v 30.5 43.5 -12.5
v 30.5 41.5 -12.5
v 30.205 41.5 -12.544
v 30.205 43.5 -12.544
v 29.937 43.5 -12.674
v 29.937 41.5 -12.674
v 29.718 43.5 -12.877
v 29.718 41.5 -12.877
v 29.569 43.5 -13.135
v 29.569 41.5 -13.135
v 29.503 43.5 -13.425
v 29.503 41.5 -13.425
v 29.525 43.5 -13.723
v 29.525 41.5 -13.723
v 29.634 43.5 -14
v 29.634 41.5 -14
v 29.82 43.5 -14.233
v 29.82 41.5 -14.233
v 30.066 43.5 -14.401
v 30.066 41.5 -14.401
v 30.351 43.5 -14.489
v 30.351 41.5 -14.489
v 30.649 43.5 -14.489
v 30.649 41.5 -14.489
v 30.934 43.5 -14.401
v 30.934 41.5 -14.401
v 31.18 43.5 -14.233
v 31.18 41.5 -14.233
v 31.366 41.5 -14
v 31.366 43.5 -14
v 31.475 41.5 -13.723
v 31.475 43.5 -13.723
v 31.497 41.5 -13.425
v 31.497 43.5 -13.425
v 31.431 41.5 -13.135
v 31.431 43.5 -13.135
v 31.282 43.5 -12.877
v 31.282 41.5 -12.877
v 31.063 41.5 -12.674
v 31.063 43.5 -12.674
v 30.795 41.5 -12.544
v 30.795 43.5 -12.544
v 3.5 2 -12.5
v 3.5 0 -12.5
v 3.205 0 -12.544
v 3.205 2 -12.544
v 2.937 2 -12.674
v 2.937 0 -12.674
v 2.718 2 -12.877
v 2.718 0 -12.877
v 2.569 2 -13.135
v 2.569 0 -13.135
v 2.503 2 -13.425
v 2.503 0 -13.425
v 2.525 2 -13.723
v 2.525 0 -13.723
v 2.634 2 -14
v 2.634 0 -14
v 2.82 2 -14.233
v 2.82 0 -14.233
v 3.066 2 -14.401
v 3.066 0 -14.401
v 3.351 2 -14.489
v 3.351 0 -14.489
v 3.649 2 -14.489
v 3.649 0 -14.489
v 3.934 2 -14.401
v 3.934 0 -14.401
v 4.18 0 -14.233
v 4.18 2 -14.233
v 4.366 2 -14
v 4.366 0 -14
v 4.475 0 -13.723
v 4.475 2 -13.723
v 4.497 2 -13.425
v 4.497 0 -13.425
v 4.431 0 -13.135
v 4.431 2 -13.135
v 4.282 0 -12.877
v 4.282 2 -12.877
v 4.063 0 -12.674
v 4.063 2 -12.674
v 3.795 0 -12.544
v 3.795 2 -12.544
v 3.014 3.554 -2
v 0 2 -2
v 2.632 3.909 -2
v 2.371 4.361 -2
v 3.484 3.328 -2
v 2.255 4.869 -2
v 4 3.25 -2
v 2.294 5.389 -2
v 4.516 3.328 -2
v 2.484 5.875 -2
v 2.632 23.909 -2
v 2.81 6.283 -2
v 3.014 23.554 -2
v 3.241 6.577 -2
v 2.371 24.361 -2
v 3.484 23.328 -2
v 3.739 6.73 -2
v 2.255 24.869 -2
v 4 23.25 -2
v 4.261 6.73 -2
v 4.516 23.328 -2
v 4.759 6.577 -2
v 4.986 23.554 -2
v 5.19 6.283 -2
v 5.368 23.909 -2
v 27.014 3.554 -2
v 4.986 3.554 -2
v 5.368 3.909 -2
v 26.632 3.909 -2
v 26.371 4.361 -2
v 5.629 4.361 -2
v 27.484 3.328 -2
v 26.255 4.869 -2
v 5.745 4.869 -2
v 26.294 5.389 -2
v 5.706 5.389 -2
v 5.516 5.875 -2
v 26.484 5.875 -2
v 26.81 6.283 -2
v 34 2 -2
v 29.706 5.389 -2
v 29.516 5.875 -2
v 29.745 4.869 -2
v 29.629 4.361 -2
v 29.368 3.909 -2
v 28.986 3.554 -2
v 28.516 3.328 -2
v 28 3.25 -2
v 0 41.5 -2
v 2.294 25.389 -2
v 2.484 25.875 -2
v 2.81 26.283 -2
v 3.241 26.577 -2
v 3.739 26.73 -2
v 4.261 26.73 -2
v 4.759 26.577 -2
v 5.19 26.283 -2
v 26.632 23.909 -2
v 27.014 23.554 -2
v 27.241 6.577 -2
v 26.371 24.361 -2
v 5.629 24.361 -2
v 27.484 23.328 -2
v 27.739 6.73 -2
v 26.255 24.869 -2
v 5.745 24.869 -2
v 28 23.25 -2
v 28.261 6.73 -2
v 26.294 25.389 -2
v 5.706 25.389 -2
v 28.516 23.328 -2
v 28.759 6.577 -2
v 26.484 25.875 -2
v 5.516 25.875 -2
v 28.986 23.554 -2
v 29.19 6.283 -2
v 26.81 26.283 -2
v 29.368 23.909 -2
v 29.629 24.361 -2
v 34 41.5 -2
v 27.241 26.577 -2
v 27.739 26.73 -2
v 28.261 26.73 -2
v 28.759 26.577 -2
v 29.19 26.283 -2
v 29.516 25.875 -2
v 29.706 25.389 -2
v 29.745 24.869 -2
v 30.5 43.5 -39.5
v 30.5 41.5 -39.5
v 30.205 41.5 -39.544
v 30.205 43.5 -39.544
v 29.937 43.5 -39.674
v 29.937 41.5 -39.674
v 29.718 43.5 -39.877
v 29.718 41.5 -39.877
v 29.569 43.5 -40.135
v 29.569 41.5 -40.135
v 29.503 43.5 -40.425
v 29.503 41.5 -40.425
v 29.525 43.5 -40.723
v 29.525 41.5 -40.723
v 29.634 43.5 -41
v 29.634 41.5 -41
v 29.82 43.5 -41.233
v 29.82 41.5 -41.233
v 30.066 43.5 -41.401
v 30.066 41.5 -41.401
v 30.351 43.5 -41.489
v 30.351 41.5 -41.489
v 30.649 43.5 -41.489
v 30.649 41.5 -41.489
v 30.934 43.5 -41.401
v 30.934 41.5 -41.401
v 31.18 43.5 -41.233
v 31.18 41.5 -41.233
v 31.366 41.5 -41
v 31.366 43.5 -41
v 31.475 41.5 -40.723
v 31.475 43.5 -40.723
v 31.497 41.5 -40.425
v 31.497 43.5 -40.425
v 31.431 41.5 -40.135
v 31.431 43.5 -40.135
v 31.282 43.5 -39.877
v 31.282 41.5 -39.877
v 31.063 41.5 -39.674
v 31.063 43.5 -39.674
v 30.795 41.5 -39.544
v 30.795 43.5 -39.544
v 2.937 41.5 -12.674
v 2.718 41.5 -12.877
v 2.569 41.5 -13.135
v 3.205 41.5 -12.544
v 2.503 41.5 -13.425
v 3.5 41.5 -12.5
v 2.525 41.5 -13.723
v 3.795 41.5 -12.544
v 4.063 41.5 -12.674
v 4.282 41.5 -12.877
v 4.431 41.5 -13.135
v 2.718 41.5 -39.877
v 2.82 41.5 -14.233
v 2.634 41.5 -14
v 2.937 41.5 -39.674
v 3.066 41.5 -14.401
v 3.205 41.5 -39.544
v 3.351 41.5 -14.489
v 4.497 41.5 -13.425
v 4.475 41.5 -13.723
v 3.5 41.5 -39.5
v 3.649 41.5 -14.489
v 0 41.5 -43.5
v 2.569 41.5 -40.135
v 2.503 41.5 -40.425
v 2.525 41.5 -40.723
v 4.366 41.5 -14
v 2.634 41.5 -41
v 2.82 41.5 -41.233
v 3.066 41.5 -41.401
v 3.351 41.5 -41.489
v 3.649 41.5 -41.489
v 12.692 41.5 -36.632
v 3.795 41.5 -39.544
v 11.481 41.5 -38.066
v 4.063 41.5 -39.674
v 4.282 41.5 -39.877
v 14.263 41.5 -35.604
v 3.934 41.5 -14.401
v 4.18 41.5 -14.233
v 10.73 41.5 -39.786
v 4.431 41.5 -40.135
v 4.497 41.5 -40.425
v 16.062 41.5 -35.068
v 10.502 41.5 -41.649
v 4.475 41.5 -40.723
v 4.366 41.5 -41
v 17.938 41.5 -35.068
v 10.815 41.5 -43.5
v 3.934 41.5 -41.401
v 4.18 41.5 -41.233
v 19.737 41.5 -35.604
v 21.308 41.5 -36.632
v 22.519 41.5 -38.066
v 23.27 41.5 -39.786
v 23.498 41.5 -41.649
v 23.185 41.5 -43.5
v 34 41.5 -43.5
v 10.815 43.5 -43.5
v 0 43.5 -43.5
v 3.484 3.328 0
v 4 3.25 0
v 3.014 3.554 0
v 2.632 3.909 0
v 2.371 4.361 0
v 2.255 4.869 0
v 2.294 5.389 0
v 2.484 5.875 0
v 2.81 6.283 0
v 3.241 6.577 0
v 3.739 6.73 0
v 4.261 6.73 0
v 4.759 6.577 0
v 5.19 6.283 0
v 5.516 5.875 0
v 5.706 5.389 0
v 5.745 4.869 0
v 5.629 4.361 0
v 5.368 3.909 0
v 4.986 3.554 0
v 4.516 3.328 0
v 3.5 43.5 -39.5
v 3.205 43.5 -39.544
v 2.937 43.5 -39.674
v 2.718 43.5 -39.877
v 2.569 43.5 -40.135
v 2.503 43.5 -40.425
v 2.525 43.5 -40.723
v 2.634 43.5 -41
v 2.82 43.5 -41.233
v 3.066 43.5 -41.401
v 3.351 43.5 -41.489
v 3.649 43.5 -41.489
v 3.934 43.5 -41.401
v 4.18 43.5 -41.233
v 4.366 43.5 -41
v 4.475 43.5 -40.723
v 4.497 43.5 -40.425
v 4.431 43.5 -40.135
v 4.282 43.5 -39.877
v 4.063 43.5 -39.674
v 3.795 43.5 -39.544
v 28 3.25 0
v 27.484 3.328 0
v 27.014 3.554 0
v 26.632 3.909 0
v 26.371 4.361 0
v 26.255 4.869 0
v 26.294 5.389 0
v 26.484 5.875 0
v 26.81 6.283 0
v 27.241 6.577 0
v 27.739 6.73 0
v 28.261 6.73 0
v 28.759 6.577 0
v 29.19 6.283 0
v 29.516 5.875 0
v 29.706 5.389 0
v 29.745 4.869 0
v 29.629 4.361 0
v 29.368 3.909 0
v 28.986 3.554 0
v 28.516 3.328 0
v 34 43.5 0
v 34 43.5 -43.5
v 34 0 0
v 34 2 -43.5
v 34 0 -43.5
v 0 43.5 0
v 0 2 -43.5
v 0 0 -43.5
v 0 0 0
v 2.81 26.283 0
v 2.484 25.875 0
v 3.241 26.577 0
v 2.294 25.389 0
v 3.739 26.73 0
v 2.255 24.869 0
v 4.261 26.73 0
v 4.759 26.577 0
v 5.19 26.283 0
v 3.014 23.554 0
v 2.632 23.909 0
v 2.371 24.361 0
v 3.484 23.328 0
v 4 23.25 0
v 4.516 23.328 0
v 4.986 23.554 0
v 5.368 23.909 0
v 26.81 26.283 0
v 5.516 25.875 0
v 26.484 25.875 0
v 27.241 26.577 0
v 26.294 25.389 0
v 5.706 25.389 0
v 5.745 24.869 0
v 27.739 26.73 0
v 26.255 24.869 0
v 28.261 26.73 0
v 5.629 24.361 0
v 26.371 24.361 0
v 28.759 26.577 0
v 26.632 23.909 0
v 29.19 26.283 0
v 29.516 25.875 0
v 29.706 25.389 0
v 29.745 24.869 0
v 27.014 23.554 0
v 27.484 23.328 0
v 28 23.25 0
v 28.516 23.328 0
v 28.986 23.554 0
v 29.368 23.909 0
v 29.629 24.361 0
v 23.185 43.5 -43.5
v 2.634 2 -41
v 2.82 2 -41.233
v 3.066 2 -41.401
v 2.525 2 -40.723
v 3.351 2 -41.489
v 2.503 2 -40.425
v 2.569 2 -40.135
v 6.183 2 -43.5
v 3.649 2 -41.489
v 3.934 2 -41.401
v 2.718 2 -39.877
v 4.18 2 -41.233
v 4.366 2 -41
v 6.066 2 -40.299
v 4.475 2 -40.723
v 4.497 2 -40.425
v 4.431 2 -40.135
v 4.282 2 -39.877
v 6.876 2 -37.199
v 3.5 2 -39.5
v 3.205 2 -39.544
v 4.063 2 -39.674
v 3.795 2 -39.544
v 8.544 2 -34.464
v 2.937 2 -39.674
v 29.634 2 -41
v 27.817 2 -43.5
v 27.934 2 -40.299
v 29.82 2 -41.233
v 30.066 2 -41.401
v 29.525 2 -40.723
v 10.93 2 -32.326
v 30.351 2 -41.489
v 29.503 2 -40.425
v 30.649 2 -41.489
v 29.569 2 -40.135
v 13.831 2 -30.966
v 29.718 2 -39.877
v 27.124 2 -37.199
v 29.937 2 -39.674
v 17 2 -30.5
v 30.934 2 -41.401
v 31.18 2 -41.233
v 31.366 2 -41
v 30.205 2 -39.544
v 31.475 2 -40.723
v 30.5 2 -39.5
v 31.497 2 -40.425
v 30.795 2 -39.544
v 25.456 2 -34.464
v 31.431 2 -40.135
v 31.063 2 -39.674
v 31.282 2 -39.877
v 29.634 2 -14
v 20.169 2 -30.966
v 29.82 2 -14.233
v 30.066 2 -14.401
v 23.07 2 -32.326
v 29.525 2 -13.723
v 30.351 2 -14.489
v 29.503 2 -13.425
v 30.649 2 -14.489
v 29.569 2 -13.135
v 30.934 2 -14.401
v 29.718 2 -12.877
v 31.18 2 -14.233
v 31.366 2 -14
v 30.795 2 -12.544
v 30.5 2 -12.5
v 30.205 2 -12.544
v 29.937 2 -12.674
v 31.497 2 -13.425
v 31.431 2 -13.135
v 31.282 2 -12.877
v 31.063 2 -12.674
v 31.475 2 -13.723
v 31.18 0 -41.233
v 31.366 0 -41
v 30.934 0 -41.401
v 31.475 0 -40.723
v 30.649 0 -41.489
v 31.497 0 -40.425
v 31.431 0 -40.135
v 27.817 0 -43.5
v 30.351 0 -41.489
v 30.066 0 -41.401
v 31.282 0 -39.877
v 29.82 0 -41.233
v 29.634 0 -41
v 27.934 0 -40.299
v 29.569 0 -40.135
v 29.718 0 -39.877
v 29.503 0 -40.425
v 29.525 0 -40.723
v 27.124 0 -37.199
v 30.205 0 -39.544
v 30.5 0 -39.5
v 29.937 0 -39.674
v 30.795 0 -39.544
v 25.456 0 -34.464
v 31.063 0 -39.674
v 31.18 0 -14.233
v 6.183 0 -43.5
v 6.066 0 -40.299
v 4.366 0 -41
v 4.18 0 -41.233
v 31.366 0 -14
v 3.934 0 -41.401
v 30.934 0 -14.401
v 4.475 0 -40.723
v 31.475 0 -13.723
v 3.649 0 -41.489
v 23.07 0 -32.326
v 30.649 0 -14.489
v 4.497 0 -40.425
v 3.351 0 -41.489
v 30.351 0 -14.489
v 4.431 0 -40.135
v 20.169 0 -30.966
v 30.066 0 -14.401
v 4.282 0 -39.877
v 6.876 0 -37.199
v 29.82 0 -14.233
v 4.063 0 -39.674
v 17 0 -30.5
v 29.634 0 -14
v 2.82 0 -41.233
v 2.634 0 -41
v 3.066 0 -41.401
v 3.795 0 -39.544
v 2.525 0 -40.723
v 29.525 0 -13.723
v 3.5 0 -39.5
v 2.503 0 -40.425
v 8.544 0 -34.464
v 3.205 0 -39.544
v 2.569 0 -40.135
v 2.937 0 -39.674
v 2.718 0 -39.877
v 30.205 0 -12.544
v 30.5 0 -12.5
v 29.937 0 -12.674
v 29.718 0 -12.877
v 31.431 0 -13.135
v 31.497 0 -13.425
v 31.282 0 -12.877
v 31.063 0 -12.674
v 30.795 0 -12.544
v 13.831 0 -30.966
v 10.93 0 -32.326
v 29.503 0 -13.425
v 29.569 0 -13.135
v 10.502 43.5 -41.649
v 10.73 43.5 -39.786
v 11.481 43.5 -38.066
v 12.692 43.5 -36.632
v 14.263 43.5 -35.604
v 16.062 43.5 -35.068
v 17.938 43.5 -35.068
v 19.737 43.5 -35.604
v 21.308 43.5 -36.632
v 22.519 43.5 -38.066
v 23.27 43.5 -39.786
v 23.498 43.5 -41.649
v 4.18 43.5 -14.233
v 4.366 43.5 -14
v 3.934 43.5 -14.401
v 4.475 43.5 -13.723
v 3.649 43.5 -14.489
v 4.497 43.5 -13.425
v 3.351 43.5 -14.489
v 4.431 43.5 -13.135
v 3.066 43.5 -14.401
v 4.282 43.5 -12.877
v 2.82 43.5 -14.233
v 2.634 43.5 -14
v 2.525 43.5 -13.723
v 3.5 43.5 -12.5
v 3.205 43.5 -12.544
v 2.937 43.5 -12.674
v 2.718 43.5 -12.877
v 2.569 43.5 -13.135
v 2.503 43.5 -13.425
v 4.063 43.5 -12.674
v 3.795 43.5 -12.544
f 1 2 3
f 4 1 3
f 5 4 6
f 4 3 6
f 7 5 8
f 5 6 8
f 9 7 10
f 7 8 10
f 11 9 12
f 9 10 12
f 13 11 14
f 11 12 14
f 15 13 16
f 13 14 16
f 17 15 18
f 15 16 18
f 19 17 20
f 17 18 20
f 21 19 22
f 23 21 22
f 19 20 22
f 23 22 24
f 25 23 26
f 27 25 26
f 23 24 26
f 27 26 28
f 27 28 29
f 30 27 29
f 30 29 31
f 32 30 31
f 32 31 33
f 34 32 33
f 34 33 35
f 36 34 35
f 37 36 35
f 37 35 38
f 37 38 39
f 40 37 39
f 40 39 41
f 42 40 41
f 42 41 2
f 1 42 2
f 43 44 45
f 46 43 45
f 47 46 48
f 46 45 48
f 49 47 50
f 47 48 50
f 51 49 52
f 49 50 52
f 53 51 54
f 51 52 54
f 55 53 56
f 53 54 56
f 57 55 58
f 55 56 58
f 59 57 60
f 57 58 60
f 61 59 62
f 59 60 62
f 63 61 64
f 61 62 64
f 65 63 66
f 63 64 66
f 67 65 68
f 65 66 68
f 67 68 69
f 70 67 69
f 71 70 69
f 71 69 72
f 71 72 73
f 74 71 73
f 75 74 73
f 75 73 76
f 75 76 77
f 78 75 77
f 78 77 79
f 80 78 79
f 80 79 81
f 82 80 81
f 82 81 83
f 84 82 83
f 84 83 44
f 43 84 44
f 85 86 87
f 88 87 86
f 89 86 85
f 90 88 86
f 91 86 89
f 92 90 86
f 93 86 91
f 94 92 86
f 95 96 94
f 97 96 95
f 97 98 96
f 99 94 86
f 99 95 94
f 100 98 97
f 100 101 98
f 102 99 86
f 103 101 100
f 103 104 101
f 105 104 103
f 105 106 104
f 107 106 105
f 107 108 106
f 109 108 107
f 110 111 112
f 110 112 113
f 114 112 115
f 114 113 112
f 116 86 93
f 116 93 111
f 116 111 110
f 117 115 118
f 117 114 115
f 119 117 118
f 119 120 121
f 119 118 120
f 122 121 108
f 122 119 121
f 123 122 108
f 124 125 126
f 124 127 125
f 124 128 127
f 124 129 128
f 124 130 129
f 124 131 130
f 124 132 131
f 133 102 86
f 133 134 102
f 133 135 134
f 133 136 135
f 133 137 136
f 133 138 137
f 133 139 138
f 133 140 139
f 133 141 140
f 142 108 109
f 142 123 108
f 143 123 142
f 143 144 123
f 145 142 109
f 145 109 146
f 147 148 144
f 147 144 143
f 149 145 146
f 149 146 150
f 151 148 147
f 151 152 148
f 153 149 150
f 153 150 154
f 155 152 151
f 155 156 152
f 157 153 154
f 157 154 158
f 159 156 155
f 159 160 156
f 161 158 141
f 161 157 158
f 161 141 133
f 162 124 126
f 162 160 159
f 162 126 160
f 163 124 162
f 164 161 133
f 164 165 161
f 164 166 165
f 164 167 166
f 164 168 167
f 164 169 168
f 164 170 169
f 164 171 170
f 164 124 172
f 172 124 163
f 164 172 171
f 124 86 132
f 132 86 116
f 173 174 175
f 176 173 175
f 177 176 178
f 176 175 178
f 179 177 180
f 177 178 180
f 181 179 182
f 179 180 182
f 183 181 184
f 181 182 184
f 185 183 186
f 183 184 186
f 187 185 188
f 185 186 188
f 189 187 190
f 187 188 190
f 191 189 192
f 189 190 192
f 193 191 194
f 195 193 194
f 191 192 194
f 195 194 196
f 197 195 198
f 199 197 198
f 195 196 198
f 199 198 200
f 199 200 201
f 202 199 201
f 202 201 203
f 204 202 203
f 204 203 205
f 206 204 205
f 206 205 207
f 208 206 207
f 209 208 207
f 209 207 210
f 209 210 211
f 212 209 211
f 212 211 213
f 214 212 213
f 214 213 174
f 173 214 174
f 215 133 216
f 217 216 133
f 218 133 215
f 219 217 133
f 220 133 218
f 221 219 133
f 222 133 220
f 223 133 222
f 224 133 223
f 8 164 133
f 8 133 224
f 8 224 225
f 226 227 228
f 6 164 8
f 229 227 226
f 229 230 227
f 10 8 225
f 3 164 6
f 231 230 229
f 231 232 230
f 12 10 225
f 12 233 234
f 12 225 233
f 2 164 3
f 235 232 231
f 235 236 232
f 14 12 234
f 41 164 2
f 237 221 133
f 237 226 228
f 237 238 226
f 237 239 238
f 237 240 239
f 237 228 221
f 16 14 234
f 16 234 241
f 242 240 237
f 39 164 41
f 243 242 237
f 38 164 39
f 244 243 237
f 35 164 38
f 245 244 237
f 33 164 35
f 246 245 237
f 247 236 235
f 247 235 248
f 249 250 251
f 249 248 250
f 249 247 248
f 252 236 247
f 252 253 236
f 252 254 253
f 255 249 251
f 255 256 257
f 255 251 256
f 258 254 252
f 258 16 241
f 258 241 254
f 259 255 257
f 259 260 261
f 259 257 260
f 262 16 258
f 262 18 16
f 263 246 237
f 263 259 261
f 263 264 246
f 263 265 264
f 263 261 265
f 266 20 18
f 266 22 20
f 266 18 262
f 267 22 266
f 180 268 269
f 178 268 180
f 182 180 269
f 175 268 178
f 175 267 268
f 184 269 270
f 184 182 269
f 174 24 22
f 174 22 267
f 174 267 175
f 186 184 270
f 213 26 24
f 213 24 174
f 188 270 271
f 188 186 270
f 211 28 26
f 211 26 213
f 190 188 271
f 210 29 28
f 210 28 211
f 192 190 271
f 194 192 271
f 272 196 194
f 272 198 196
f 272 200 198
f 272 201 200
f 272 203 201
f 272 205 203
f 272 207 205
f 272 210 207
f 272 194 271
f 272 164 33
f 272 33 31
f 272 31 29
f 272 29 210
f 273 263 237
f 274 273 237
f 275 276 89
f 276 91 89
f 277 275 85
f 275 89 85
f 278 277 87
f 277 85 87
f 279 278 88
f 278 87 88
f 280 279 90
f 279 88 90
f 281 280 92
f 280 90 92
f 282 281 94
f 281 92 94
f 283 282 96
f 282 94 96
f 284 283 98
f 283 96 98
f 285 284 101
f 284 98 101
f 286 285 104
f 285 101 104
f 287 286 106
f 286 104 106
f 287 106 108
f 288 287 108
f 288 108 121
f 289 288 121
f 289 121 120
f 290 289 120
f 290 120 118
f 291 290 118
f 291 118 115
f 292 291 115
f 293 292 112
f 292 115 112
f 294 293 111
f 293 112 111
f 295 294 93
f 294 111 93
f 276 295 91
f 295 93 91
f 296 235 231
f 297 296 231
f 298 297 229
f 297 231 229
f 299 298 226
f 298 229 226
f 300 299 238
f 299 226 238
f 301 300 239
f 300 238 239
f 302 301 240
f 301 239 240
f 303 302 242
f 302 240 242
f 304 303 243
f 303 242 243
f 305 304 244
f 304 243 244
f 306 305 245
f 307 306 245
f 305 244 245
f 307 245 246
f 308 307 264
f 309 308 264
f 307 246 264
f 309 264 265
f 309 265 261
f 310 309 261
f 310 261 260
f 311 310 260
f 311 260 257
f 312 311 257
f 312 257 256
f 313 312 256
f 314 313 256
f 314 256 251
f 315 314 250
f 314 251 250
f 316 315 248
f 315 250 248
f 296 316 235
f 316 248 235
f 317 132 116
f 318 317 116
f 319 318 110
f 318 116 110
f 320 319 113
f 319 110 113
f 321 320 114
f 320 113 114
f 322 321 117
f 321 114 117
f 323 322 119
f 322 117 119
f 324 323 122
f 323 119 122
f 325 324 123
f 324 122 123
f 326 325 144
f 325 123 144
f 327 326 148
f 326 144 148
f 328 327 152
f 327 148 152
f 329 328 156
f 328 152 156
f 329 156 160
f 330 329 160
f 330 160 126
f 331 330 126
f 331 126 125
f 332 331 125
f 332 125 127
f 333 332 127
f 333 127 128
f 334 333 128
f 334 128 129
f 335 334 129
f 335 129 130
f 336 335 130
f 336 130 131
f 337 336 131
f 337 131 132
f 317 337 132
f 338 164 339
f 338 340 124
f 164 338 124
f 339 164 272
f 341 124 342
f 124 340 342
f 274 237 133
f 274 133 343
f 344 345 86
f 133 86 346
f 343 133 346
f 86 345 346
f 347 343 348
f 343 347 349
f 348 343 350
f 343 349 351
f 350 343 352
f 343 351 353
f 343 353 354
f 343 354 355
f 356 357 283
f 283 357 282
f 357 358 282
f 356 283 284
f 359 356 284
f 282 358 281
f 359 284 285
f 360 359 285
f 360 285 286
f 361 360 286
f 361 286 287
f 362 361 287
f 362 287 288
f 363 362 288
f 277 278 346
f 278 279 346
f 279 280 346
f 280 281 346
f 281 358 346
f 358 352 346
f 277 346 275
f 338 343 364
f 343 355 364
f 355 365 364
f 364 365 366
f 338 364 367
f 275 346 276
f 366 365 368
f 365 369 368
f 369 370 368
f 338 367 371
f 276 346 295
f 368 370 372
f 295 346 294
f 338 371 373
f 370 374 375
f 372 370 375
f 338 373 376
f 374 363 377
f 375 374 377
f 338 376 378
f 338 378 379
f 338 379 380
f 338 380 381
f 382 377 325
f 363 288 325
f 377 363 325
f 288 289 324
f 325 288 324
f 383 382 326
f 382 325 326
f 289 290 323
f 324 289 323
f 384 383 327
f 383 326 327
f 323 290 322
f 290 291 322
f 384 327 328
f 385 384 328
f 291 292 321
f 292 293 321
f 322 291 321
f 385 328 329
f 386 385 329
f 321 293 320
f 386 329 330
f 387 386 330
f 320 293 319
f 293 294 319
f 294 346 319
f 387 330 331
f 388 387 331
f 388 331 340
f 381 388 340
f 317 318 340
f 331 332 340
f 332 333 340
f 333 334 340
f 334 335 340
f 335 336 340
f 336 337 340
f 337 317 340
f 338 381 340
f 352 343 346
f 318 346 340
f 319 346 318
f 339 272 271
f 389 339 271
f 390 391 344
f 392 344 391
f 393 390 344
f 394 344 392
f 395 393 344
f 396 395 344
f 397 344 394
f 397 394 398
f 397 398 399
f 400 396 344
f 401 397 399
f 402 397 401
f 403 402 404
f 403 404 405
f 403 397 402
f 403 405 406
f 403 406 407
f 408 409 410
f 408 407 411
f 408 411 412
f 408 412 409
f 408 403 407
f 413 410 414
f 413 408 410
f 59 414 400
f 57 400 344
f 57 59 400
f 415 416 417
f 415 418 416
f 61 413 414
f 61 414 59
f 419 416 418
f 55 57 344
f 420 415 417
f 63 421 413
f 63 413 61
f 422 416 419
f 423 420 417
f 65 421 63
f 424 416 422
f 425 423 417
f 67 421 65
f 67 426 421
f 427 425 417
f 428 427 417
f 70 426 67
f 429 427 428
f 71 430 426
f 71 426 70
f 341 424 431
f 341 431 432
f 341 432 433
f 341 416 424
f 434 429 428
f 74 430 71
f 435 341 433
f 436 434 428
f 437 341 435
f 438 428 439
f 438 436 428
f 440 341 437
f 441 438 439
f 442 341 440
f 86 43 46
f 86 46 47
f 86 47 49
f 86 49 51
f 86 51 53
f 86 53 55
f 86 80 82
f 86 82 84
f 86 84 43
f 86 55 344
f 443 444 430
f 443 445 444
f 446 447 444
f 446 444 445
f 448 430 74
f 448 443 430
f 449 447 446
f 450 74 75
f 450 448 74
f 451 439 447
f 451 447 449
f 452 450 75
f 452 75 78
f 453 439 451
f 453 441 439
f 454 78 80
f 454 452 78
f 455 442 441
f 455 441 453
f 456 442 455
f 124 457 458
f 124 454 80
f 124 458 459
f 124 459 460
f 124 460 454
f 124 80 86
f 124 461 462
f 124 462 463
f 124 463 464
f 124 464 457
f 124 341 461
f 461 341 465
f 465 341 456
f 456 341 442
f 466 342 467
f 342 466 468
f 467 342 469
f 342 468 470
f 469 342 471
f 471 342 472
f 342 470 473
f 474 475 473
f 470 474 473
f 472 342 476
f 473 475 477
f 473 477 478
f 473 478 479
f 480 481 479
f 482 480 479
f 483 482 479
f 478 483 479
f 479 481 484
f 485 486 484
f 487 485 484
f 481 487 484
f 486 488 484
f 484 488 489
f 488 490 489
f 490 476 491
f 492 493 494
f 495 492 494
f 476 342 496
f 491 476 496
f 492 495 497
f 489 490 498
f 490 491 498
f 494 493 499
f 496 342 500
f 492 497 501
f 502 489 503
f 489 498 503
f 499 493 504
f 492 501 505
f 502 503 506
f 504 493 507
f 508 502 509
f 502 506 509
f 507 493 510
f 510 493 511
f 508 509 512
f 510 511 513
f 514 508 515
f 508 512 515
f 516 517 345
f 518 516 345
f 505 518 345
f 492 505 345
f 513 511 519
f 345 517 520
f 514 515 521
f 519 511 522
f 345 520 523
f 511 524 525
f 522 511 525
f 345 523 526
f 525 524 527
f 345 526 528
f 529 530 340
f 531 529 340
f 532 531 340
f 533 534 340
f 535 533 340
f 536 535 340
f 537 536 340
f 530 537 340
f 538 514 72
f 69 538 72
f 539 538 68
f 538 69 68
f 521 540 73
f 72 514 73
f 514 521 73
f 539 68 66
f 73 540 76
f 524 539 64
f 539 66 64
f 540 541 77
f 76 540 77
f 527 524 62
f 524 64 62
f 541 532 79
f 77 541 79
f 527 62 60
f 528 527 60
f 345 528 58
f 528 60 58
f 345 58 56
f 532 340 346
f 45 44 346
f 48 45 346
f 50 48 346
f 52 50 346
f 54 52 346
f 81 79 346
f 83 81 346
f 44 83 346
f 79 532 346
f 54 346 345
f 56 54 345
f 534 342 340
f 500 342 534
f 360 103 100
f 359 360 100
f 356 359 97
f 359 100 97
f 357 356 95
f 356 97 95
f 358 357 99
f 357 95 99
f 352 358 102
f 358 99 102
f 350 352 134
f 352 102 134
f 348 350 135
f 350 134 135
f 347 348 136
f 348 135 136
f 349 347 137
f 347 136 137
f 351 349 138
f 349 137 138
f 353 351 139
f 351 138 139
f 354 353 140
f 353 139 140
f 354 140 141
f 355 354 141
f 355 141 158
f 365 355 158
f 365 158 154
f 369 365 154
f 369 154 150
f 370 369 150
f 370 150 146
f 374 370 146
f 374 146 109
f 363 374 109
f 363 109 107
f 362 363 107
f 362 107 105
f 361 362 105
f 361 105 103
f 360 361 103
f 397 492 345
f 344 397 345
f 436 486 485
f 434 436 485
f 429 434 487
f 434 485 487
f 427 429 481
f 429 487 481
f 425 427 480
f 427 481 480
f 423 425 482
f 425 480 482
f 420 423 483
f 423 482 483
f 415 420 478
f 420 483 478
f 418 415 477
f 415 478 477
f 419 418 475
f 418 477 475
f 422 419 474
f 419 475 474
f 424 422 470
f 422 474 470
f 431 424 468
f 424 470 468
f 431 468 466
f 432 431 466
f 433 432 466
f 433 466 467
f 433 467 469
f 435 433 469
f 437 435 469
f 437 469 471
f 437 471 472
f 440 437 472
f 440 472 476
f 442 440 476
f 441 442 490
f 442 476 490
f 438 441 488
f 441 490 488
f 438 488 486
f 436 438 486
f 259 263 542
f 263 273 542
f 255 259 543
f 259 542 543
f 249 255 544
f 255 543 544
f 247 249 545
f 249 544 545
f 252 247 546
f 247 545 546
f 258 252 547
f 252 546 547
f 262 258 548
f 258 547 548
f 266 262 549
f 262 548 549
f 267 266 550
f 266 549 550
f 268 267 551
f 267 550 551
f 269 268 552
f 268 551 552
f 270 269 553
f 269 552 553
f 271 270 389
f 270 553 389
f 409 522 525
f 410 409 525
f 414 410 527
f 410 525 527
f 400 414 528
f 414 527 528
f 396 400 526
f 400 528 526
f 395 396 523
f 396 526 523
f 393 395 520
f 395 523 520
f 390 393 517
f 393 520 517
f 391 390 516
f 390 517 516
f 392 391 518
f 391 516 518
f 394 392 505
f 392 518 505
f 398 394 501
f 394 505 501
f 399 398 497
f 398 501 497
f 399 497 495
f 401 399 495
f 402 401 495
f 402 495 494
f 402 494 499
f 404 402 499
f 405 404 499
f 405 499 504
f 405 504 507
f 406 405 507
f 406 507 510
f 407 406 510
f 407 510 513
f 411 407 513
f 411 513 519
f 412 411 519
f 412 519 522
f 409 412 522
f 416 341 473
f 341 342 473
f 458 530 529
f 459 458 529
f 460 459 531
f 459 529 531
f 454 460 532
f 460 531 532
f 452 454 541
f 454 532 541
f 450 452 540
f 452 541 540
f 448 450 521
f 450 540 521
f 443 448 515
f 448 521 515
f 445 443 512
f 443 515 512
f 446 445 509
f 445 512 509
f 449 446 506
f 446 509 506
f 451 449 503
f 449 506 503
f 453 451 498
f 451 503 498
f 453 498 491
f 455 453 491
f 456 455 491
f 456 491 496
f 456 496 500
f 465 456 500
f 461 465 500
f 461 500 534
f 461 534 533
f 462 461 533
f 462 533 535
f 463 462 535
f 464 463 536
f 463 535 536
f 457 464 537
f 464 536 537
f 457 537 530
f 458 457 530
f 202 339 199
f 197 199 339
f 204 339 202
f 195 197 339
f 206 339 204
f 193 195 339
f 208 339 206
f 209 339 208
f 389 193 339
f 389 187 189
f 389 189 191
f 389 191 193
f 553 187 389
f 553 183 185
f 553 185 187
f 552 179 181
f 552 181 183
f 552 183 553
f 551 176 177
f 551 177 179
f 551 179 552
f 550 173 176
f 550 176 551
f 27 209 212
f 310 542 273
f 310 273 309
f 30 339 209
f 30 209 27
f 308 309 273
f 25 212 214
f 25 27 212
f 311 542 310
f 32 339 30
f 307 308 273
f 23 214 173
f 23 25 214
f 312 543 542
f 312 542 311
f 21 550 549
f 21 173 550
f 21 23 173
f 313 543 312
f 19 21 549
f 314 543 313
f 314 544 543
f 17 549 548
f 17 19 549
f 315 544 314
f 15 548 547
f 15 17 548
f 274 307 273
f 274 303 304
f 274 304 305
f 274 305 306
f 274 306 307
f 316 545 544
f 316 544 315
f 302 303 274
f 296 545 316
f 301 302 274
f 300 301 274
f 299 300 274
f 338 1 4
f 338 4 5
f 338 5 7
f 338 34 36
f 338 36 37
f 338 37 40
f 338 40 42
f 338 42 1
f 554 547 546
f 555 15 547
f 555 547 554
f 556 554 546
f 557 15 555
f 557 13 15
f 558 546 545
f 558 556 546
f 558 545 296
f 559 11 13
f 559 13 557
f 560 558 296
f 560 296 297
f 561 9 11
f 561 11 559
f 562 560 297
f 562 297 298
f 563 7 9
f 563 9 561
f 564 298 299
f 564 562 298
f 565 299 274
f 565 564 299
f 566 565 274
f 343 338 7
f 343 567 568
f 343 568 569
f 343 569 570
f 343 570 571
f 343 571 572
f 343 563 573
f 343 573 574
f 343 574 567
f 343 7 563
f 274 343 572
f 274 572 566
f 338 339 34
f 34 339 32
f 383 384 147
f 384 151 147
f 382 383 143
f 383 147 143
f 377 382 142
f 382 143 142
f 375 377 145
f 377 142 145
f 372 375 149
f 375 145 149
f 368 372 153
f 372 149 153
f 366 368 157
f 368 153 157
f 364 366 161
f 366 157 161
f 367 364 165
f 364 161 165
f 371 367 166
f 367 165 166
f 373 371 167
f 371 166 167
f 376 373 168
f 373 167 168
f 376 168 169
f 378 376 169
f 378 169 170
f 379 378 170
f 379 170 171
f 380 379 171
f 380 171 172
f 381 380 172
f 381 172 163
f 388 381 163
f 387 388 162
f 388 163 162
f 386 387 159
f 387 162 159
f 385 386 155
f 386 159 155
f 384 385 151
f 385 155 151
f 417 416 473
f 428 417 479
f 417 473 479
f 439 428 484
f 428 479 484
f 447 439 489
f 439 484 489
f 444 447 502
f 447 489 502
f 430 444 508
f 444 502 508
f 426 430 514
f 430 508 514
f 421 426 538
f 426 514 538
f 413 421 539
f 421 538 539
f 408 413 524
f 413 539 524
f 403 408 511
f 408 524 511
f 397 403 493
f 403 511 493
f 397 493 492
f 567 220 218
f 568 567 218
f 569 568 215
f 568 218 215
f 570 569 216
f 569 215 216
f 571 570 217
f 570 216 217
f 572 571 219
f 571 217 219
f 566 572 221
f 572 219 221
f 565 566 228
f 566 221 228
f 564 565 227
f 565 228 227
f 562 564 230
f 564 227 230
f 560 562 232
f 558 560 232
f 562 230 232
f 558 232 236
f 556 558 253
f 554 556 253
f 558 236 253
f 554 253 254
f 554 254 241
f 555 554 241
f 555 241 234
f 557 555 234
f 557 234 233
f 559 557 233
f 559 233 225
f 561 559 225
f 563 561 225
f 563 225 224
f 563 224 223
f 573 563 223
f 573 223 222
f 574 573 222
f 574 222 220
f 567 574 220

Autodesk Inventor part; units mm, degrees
ref_plane "YZ Plane" through (0, 0, 0) normal (1, 0, 0) x (0, 1, 0)
ref_plane "XZ Plane" through (0, 0, 0) normal (0, 1, 0) x (-1, 0, 0)
ref_plane "XY Plane" through (0, 0, 0) normal (0, 0, 1) x (1, 0, 0)
sketch "スケッチ1" plane through (0, 0, 0) normal (0, 1, 0) x (-1, 0, 0)
  line L0 (0, 0) -> (-34, 0)
  line L1 (-34, 0) -> (-34, -43.5)
  line L2 (-34, -43.5) -> (0, -43.5)
  line L3 (0, -43.5) -> (0, 0)
  dimension "d0" = 43.5
  dimension "d1" = 34
extrude "押し出し1" add sketch "スケッチ1" along normal blind 43.5
sketch "スケッチ2" plane through (34, 0, 0) normal (1, 0, 0) x (0, 0, -1)
  line L0 (2, 41.5) -> (52, 41.5)
  line L1 (52, 41.5) -> (52, 2)
  line L2 (52, 2) -> (2, 2)
  line L3 (2, 2) -> (2, 41.5)
  line L4 (0, 43.5) -> (43.5, 43.5) projected
  line L5 (0, 0) -> (0, 43.5) projected
  dimension "d4" = 2
  dimension "d5" = 2
  dimension "d6" = 39.5
  dimension "d7" = 50
extrude "押し出し2" cut sketch "スケッチ2" against normal blind 43.5
sketch "スケッチ3" plane through (0, 0, 0) normal (0, -1, 0) x (1, 0, 0)
  circle A0 centre (17, -41.5) radius 11
  line L0 (34, -43.5) -> (0, -43.5) projected
  line L1 (0, -43.5) -> (0, 0) projected
  point P0 (6.1833, -43.5)
  point P1 (27.8167, -43.5)
  dimension "d10" = 22
  dimension "d11" = 2
  dimension "d12" = 17
extrude "押し出し3" cut sketch "スケッチ3" against normal blind 2 contours A0 L0 picked at (20.7405, -37.2254)
sketch "スケッチ4" plane through (0, 43.5, 0) normal (0, 1, 0) x (1, 0, 0)
  circle A0 centre (17, 41.5) radius 6.5
  line L0 (34, 43.5) -> (0, 43.5) projected
  line L1 (0, 43.5) -> (0, 0) projected
  point P0 (23.1847, 43.5)
  point P1 (10.8153, 43.5)
  point P2 (0, 35.0774)
  dimension "d15" = 13
  dimension "d16" = 2
  dimension "d17" = 17
extrude "押し出し4" cut sketch "スケッチ4" against normal blind 2
sketch "スケッチ5" plane through (0, 43.5, 0) normal (0, 1, 0) x (1, 0, 0)
  line L0 (0, 0) -> (34, 0) projected
  line L1 (0, 43.5) -> (0, 0) projected
  line L2 (34, 0) -> (34, 43.5) projected
  point P0 (3.5, 13.5)
  point P1 (3.5, 40.5)
  point P2 (30.5, 40.5)
  point P3 (30.5, 13.5)
  dimension "d20" = 13.5
  dimension "d21" = 3.5
  dimension "d22" = 27
  dimension "d23" = 3.5
  dimension "d48" = 3.5
hole "穴1" at (3.5, 43.5, -13.5) at (3.5, 43.5, -40.5) at (30.5, 43.5, -40.5) at (30.5, 43.5, -13.5) direction (0, -1, 0) diameter 2 end through all
sketch "スケッチ6" plane through (0, 0, 0) normal (0, 0, 1) x (1, 0, 0)
  line L0 (0, 0) -> (34, 0) projected
  line L1 (0, 0) -> (0, 43.5) projected
  point P0 (4, 5)
  point P1 (4, 25)
  point P2 (28, 5)
  point P3 (28, 25)
  dimension "d31" = 5
  dimension "d32" = 4
  dimension "d35" = 20
  dimension "d38" = 24
hole "穴2" at (4, 5, 0) at (4, 25, 0) at (28, 5, 0) at (28, 25, 0) direction (0, 0, -1) diameter 3.5 end through all
properties part number "サーボモータ固定用"
